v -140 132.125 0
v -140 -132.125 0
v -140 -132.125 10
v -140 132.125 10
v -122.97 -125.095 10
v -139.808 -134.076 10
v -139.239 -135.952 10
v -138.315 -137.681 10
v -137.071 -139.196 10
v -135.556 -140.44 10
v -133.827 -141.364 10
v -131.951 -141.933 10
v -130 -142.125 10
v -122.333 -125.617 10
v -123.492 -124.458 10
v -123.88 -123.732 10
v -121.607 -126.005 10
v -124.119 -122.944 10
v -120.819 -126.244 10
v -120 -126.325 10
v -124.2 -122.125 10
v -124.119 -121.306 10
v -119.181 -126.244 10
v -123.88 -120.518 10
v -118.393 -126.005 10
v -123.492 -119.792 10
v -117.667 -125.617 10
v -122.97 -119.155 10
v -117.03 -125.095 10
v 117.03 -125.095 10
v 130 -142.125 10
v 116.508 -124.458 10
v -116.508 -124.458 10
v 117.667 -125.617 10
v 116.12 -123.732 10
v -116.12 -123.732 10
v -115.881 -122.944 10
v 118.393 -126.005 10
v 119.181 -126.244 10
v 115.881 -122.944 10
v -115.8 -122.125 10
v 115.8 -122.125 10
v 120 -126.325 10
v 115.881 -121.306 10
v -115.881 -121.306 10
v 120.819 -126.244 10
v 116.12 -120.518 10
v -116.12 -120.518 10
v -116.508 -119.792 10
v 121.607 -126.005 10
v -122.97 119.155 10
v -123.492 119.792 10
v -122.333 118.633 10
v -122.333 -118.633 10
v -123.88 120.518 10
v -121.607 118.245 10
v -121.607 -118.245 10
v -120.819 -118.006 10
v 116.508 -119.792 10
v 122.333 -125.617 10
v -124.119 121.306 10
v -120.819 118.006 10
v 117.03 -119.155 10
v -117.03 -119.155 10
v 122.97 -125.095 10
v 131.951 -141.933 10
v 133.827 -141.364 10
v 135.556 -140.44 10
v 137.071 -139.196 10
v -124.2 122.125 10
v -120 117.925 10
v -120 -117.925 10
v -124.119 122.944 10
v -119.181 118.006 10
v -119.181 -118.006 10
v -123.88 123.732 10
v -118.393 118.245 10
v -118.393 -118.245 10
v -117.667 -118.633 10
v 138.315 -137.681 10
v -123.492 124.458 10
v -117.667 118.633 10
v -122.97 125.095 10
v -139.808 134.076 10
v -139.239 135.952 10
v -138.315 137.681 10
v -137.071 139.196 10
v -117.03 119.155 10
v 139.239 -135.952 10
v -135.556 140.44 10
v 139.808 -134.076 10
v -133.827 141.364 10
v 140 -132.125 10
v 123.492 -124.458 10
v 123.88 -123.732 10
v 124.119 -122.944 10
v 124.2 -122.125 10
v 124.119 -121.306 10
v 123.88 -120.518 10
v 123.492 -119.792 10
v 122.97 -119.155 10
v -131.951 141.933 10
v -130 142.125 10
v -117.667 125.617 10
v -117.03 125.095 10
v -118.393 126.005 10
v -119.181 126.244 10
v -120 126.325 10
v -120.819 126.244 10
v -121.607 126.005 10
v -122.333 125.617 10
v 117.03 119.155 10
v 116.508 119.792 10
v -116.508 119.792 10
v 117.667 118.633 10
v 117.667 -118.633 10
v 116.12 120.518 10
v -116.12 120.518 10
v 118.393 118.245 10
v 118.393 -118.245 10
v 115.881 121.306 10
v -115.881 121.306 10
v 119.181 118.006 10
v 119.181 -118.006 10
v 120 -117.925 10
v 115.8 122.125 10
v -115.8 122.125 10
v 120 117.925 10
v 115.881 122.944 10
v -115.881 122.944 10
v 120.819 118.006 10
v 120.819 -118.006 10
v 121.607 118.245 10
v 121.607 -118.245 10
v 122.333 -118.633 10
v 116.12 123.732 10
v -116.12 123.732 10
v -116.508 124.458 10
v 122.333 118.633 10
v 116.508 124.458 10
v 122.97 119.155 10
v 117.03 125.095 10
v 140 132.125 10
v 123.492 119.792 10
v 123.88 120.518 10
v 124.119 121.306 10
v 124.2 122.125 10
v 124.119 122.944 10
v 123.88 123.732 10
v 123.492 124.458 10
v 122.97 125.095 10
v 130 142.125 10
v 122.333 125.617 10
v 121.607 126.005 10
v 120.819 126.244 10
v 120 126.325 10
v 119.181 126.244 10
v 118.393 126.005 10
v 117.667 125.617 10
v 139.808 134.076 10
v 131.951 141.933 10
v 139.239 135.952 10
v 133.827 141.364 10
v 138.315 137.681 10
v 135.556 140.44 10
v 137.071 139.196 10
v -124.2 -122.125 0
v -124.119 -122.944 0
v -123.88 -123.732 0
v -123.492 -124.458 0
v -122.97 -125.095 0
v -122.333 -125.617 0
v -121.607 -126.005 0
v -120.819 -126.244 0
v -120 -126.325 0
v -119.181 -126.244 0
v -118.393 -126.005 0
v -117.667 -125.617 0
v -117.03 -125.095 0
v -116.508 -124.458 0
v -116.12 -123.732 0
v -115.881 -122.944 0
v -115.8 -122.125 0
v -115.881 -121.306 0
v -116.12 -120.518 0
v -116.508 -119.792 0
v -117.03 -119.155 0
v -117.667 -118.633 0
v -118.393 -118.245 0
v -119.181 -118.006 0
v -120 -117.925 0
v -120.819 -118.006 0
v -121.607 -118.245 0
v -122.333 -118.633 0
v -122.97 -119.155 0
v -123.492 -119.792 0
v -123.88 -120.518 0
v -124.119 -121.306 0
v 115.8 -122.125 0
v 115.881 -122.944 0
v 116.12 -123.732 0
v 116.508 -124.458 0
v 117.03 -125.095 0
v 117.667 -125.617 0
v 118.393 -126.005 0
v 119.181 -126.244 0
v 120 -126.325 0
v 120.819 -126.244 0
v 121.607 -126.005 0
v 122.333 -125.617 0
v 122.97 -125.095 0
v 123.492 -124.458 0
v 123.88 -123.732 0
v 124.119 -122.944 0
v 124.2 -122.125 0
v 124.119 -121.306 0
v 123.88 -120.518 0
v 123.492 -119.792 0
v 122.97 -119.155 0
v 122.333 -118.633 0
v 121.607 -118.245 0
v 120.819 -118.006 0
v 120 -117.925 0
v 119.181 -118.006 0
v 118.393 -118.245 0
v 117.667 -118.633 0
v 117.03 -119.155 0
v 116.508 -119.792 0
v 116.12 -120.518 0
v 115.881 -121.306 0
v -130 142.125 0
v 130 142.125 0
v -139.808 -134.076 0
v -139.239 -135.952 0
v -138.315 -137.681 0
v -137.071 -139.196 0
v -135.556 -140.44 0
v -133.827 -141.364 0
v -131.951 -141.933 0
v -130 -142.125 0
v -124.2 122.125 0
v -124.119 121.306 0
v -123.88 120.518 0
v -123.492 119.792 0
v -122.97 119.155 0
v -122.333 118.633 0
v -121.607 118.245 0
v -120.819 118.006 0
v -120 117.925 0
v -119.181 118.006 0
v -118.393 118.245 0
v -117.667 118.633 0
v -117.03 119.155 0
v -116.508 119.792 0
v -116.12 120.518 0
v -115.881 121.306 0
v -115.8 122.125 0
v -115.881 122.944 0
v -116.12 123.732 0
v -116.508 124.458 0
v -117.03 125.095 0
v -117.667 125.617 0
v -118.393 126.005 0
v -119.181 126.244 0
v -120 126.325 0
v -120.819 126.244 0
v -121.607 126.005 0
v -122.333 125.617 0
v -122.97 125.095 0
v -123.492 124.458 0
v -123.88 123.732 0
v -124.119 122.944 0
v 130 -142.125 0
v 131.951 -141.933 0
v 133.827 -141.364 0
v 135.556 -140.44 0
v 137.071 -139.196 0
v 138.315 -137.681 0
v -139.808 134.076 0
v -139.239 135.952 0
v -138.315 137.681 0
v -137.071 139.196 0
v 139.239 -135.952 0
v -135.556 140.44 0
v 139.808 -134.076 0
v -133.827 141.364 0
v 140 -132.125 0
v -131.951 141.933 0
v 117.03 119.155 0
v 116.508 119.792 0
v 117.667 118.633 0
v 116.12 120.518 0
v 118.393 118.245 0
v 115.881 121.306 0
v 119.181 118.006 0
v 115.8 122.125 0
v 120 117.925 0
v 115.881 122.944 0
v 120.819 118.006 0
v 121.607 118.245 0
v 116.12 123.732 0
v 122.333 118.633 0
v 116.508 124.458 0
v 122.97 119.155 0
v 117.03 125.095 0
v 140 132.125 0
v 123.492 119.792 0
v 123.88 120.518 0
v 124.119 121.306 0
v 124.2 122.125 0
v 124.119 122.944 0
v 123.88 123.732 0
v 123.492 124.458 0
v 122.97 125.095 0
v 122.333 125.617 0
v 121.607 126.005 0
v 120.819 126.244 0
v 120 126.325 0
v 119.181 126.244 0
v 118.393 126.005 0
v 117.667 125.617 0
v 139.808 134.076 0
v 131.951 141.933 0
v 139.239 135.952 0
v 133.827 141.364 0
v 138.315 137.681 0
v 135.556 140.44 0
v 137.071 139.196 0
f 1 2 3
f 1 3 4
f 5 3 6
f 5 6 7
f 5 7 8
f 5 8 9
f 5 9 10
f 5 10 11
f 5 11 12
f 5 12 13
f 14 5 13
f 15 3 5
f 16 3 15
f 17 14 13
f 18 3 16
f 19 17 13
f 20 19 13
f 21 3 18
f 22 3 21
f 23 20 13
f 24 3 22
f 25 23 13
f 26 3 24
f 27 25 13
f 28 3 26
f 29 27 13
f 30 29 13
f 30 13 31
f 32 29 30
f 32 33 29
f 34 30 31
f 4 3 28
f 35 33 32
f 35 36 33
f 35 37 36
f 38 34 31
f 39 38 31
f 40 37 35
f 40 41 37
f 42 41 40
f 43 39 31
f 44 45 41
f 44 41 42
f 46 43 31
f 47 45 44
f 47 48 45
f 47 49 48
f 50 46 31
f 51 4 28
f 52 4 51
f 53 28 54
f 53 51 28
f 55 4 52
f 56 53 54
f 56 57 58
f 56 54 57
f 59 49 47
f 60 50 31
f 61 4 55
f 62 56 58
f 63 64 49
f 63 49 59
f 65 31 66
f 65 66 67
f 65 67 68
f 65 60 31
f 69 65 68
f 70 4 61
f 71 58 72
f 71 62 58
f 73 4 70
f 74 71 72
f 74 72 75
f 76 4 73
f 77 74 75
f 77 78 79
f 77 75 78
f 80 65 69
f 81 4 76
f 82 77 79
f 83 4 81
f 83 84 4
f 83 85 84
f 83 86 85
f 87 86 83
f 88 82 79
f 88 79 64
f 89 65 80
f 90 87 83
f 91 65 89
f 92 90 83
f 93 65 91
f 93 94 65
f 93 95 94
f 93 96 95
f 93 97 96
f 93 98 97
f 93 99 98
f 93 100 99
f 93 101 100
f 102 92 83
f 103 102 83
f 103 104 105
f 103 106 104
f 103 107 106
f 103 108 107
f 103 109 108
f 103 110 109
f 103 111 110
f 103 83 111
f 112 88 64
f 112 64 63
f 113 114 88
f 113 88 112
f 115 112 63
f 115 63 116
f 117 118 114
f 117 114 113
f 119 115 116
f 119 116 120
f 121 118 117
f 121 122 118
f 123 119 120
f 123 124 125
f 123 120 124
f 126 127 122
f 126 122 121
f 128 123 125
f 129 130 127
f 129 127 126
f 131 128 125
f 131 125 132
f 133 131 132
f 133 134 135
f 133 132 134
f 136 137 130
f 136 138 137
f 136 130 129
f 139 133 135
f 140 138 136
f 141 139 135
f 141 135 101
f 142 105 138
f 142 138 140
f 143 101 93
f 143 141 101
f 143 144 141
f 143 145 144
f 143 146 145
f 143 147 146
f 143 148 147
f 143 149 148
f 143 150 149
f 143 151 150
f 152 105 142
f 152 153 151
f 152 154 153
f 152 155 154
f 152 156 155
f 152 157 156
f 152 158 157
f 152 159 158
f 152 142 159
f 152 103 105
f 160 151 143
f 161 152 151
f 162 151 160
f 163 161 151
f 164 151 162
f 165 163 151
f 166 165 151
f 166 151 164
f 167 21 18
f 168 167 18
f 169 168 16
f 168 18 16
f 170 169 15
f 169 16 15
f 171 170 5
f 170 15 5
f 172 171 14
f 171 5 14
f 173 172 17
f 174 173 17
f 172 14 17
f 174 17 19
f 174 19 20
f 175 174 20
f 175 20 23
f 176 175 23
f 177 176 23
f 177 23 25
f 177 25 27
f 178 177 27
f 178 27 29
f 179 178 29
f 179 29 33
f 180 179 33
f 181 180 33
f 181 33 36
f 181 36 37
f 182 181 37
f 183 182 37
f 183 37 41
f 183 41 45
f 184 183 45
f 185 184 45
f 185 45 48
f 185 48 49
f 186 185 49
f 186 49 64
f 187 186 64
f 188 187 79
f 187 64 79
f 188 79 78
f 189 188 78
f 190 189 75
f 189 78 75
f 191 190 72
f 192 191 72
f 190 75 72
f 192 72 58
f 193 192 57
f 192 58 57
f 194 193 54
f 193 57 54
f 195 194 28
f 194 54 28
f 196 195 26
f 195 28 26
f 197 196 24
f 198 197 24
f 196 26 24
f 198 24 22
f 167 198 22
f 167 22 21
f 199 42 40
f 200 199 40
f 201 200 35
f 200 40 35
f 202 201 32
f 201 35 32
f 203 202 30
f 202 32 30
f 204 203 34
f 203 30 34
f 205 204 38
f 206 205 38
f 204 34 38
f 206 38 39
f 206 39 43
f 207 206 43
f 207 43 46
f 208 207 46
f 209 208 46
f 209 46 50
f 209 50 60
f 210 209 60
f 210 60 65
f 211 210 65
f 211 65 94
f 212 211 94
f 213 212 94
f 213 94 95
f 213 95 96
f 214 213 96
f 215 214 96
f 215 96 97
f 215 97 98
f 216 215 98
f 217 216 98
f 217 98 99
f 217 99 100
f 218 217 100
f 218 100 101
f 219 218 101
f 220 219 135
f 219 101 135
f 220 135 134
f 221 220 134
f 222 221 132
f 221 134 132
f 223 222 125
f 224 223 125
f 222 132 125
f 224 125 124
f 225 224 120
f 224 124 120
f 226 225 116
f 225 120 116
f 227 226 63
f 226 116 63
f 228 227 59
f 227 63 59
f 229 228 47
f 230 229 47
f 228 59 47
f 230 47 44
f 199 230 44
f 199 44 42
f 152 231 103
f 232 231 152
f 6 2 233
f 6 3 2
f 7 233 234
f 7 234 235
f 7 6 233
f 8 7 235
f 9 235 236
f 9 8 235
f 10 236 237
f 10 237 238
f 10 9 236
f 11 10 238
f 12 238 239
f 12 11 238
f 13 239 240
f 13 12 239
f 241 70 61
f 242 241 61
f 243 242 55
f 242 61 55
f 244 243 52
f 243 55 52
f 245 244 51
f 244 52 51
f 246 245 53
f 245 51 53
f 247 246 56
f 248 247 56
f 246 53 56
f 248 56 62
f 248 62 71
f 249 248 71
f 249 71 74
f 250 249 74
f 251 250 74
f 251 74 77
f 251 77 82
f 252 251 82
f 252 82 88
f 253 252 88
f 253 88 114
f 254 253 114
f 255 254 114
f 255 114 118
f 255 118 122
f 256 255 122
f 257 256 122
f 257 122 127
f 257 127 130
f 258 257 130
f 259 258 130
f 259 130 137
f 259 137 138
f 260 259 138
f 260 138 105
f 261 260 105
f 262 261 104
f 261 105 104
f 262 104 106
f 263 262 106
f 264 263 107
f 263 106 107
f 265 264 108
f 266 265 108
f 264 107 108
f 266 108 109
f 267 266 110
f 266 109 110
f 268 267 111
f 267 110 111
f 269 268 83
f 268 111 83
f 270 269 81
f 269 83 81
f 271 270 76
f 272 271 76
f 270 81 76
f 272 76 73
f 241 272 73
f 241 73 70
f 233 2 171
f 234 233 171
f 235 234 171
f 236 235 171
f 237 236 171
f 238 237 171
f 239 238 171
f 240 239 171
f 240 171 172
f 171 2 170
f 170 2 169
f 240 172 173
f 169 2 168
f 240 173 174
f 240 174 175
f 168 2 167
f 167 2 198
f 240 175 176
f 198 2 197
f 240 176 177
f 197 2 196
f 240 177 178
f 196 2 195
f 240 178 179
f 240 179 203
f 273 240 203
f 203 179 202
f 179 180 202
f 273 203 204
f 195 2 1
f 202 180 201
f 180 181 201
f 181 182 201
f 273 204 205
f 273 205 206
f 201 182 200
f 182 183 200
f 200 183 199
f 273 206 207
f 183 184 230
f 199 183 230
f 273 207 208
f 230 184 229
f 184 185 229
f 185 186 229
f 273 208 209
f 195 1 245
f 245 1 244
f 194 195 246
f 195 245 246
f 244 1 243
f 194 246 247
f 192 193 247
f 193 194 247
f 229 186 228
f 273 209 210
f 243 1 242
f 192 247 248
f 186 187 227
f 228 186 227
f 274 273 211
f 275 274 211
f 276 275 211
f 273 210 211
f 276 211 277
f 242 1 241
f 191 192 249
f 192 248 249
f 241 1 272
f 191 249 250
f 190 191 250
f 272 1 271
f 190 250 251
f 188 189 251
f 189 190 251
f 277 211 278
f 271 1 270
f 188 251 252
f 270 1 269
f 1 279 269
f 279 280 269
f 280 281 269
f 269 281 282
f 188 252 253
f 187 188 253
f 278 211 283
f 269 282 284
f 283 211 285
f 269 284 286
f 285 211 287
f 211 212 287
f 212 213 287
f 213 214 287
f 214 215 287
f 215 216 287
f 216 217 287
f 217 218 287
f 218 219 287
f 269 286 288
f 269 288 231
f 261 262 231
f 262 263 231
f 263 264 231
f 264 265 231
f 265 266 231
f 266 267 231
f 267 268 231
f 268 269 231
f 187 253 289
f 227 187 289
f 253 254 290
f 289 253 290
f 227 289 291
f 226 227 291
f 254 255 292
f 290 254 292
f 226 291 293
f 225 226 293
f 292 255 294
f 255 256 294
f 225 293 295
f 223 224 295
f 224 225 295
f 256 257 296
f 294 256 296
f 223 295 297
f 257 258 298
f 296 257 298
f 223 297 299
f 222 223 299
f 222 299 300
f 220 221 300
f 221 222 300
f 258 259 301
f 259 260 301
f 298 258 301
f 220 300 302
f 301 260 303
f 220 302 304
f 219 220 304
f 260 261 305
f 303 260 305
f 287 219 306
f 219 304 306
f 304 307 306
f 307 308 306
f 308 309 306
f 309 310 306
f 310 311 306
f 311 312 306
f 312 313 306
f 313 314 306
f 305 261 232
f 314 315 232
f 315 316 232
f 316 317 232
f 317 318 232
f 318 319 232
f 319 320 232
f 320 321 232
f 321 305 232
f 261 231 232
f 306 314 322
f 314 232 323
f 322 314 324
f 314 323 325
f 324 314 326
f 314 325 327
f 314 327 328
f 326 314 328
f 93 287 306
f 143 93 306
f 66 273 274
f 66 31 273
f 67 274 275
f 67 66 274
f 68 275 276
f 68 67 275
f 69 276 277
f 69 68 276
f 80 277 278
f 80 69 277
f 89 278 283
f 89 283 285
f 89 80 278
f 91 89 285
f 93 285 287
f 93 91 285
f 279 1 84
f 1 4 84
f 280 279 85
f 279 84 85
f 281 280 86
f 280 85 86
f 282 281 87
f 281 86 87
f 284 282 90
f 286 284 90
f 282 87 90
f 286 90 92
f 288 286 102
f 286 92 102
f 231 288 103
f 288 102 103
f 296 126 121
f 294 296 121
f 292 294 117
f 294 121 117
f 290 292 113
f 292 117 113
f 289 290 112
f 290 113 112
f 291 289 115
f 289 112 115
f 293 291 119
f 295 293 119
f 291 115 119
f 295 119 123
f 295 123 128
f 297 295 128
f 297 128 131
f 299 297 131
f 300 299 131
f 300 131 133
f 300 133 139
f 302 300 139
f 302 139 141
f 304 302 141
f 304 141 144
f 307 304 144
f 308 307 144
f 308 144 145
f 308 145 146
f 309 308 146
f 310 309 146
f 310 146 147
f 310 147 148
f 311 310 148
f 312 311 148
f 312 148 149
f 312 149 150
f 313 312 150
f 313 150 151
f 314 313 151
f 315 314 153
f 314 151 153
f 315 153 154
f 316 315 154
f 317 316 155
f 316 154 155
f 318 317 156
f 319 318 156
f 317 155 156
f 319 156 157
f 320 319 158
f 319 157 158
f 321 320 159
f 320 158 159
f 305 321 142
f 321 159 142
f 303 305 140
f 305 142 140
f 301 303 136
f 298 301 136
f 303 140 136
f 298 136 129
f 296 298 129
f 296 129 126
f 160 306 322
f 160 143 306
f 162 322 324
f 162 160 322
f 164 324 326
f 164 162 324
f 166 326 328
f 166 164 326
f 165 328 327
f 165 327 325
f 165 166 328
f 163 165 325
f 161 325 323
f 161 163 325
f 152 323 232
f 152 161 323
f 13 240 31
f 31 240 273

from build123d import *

# Parameters (mm, degrees)
SKETCH_1_W              = 280
SKETCH_1_H              = 284.25
EXTRUDE_1_DEPTH         = 10
FILLET_1_R              = 10
HOLE_WIZARD_8_4_8_4_1_D = 8.4


with BuildPart() as part:
    # 草图1 → 凸台-拉伸1 (new body)
    with BuildSketch(Plane.XY):
        Rectangle(SKETCH_1_W, SKETCH_1_H)
    extrude(amount=EXTRUDE_1_DEPTH)

    # 圆角1
    fillet_1_edges = [part.edges().sort_by_distance(p)[0] for p in [
        (140, -142.125, 5),
        (-140, -142.125, 5),
        (-140, 142.125, 5),
        (140, 142.125, 5),
    ]]
    fillet(fillet_1_edges, radius=FILLET_1_R)

    # Ø8.4 (8.4) 直径孔1 (through all)
    with Locations(Plane(origin=(0, 0, 0), x_dir=(1, 0, 0), z_dir=(0, 0, -1))):
        with Locations((-120, -122.125), (120, -122.125), (120, 122.125), (-120, 122.125)):
            Hole(HOLE_WIZARD_8_4_8_4_1_D / 2)


solid = part.part
